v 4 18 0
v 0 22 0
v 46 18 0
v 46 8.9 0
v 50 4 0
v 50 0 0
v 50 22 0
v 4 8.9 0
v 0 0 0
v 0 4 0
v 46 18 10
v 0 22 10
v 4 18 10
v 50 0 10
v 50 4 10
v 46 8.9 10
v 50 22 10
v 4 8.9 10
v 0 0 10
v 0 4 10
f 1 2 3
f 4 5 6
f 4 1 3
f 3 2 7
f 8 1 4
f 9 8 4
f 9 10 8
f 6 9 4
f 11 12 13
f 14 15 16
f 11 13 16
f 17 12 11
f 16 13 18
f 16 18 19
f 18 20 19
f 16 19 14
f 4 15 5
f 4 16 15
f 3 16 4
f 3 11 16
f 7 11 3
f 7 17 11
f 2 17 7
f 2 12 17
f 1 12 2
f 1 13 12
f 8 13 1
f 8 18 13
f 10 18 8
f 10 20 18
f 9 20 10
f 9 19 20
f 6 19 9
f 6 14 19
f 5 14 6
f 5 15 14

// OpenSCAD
$fn = 32;

// ----------------------------------------------------------------------
// Key bar: dovetail key, 10 mm thick
// ----------------------------------------------------------------------

// --- parameters (mm) ---
profile_height = 10;      // extrusion height
profile_points = 10;      // points of the closed outline

profile = [[0, 0], [50, 0], [50, 4], [46, 8.9], [46, 18], [50, 22], [0, 22], [4, 18], [4, 8.9], [0, 4]];  // single closed polygon, 10 points, counter clockwise

// --- the one profile operation ---
linear_extrude(height = profile_height) polygon(points = profile);
